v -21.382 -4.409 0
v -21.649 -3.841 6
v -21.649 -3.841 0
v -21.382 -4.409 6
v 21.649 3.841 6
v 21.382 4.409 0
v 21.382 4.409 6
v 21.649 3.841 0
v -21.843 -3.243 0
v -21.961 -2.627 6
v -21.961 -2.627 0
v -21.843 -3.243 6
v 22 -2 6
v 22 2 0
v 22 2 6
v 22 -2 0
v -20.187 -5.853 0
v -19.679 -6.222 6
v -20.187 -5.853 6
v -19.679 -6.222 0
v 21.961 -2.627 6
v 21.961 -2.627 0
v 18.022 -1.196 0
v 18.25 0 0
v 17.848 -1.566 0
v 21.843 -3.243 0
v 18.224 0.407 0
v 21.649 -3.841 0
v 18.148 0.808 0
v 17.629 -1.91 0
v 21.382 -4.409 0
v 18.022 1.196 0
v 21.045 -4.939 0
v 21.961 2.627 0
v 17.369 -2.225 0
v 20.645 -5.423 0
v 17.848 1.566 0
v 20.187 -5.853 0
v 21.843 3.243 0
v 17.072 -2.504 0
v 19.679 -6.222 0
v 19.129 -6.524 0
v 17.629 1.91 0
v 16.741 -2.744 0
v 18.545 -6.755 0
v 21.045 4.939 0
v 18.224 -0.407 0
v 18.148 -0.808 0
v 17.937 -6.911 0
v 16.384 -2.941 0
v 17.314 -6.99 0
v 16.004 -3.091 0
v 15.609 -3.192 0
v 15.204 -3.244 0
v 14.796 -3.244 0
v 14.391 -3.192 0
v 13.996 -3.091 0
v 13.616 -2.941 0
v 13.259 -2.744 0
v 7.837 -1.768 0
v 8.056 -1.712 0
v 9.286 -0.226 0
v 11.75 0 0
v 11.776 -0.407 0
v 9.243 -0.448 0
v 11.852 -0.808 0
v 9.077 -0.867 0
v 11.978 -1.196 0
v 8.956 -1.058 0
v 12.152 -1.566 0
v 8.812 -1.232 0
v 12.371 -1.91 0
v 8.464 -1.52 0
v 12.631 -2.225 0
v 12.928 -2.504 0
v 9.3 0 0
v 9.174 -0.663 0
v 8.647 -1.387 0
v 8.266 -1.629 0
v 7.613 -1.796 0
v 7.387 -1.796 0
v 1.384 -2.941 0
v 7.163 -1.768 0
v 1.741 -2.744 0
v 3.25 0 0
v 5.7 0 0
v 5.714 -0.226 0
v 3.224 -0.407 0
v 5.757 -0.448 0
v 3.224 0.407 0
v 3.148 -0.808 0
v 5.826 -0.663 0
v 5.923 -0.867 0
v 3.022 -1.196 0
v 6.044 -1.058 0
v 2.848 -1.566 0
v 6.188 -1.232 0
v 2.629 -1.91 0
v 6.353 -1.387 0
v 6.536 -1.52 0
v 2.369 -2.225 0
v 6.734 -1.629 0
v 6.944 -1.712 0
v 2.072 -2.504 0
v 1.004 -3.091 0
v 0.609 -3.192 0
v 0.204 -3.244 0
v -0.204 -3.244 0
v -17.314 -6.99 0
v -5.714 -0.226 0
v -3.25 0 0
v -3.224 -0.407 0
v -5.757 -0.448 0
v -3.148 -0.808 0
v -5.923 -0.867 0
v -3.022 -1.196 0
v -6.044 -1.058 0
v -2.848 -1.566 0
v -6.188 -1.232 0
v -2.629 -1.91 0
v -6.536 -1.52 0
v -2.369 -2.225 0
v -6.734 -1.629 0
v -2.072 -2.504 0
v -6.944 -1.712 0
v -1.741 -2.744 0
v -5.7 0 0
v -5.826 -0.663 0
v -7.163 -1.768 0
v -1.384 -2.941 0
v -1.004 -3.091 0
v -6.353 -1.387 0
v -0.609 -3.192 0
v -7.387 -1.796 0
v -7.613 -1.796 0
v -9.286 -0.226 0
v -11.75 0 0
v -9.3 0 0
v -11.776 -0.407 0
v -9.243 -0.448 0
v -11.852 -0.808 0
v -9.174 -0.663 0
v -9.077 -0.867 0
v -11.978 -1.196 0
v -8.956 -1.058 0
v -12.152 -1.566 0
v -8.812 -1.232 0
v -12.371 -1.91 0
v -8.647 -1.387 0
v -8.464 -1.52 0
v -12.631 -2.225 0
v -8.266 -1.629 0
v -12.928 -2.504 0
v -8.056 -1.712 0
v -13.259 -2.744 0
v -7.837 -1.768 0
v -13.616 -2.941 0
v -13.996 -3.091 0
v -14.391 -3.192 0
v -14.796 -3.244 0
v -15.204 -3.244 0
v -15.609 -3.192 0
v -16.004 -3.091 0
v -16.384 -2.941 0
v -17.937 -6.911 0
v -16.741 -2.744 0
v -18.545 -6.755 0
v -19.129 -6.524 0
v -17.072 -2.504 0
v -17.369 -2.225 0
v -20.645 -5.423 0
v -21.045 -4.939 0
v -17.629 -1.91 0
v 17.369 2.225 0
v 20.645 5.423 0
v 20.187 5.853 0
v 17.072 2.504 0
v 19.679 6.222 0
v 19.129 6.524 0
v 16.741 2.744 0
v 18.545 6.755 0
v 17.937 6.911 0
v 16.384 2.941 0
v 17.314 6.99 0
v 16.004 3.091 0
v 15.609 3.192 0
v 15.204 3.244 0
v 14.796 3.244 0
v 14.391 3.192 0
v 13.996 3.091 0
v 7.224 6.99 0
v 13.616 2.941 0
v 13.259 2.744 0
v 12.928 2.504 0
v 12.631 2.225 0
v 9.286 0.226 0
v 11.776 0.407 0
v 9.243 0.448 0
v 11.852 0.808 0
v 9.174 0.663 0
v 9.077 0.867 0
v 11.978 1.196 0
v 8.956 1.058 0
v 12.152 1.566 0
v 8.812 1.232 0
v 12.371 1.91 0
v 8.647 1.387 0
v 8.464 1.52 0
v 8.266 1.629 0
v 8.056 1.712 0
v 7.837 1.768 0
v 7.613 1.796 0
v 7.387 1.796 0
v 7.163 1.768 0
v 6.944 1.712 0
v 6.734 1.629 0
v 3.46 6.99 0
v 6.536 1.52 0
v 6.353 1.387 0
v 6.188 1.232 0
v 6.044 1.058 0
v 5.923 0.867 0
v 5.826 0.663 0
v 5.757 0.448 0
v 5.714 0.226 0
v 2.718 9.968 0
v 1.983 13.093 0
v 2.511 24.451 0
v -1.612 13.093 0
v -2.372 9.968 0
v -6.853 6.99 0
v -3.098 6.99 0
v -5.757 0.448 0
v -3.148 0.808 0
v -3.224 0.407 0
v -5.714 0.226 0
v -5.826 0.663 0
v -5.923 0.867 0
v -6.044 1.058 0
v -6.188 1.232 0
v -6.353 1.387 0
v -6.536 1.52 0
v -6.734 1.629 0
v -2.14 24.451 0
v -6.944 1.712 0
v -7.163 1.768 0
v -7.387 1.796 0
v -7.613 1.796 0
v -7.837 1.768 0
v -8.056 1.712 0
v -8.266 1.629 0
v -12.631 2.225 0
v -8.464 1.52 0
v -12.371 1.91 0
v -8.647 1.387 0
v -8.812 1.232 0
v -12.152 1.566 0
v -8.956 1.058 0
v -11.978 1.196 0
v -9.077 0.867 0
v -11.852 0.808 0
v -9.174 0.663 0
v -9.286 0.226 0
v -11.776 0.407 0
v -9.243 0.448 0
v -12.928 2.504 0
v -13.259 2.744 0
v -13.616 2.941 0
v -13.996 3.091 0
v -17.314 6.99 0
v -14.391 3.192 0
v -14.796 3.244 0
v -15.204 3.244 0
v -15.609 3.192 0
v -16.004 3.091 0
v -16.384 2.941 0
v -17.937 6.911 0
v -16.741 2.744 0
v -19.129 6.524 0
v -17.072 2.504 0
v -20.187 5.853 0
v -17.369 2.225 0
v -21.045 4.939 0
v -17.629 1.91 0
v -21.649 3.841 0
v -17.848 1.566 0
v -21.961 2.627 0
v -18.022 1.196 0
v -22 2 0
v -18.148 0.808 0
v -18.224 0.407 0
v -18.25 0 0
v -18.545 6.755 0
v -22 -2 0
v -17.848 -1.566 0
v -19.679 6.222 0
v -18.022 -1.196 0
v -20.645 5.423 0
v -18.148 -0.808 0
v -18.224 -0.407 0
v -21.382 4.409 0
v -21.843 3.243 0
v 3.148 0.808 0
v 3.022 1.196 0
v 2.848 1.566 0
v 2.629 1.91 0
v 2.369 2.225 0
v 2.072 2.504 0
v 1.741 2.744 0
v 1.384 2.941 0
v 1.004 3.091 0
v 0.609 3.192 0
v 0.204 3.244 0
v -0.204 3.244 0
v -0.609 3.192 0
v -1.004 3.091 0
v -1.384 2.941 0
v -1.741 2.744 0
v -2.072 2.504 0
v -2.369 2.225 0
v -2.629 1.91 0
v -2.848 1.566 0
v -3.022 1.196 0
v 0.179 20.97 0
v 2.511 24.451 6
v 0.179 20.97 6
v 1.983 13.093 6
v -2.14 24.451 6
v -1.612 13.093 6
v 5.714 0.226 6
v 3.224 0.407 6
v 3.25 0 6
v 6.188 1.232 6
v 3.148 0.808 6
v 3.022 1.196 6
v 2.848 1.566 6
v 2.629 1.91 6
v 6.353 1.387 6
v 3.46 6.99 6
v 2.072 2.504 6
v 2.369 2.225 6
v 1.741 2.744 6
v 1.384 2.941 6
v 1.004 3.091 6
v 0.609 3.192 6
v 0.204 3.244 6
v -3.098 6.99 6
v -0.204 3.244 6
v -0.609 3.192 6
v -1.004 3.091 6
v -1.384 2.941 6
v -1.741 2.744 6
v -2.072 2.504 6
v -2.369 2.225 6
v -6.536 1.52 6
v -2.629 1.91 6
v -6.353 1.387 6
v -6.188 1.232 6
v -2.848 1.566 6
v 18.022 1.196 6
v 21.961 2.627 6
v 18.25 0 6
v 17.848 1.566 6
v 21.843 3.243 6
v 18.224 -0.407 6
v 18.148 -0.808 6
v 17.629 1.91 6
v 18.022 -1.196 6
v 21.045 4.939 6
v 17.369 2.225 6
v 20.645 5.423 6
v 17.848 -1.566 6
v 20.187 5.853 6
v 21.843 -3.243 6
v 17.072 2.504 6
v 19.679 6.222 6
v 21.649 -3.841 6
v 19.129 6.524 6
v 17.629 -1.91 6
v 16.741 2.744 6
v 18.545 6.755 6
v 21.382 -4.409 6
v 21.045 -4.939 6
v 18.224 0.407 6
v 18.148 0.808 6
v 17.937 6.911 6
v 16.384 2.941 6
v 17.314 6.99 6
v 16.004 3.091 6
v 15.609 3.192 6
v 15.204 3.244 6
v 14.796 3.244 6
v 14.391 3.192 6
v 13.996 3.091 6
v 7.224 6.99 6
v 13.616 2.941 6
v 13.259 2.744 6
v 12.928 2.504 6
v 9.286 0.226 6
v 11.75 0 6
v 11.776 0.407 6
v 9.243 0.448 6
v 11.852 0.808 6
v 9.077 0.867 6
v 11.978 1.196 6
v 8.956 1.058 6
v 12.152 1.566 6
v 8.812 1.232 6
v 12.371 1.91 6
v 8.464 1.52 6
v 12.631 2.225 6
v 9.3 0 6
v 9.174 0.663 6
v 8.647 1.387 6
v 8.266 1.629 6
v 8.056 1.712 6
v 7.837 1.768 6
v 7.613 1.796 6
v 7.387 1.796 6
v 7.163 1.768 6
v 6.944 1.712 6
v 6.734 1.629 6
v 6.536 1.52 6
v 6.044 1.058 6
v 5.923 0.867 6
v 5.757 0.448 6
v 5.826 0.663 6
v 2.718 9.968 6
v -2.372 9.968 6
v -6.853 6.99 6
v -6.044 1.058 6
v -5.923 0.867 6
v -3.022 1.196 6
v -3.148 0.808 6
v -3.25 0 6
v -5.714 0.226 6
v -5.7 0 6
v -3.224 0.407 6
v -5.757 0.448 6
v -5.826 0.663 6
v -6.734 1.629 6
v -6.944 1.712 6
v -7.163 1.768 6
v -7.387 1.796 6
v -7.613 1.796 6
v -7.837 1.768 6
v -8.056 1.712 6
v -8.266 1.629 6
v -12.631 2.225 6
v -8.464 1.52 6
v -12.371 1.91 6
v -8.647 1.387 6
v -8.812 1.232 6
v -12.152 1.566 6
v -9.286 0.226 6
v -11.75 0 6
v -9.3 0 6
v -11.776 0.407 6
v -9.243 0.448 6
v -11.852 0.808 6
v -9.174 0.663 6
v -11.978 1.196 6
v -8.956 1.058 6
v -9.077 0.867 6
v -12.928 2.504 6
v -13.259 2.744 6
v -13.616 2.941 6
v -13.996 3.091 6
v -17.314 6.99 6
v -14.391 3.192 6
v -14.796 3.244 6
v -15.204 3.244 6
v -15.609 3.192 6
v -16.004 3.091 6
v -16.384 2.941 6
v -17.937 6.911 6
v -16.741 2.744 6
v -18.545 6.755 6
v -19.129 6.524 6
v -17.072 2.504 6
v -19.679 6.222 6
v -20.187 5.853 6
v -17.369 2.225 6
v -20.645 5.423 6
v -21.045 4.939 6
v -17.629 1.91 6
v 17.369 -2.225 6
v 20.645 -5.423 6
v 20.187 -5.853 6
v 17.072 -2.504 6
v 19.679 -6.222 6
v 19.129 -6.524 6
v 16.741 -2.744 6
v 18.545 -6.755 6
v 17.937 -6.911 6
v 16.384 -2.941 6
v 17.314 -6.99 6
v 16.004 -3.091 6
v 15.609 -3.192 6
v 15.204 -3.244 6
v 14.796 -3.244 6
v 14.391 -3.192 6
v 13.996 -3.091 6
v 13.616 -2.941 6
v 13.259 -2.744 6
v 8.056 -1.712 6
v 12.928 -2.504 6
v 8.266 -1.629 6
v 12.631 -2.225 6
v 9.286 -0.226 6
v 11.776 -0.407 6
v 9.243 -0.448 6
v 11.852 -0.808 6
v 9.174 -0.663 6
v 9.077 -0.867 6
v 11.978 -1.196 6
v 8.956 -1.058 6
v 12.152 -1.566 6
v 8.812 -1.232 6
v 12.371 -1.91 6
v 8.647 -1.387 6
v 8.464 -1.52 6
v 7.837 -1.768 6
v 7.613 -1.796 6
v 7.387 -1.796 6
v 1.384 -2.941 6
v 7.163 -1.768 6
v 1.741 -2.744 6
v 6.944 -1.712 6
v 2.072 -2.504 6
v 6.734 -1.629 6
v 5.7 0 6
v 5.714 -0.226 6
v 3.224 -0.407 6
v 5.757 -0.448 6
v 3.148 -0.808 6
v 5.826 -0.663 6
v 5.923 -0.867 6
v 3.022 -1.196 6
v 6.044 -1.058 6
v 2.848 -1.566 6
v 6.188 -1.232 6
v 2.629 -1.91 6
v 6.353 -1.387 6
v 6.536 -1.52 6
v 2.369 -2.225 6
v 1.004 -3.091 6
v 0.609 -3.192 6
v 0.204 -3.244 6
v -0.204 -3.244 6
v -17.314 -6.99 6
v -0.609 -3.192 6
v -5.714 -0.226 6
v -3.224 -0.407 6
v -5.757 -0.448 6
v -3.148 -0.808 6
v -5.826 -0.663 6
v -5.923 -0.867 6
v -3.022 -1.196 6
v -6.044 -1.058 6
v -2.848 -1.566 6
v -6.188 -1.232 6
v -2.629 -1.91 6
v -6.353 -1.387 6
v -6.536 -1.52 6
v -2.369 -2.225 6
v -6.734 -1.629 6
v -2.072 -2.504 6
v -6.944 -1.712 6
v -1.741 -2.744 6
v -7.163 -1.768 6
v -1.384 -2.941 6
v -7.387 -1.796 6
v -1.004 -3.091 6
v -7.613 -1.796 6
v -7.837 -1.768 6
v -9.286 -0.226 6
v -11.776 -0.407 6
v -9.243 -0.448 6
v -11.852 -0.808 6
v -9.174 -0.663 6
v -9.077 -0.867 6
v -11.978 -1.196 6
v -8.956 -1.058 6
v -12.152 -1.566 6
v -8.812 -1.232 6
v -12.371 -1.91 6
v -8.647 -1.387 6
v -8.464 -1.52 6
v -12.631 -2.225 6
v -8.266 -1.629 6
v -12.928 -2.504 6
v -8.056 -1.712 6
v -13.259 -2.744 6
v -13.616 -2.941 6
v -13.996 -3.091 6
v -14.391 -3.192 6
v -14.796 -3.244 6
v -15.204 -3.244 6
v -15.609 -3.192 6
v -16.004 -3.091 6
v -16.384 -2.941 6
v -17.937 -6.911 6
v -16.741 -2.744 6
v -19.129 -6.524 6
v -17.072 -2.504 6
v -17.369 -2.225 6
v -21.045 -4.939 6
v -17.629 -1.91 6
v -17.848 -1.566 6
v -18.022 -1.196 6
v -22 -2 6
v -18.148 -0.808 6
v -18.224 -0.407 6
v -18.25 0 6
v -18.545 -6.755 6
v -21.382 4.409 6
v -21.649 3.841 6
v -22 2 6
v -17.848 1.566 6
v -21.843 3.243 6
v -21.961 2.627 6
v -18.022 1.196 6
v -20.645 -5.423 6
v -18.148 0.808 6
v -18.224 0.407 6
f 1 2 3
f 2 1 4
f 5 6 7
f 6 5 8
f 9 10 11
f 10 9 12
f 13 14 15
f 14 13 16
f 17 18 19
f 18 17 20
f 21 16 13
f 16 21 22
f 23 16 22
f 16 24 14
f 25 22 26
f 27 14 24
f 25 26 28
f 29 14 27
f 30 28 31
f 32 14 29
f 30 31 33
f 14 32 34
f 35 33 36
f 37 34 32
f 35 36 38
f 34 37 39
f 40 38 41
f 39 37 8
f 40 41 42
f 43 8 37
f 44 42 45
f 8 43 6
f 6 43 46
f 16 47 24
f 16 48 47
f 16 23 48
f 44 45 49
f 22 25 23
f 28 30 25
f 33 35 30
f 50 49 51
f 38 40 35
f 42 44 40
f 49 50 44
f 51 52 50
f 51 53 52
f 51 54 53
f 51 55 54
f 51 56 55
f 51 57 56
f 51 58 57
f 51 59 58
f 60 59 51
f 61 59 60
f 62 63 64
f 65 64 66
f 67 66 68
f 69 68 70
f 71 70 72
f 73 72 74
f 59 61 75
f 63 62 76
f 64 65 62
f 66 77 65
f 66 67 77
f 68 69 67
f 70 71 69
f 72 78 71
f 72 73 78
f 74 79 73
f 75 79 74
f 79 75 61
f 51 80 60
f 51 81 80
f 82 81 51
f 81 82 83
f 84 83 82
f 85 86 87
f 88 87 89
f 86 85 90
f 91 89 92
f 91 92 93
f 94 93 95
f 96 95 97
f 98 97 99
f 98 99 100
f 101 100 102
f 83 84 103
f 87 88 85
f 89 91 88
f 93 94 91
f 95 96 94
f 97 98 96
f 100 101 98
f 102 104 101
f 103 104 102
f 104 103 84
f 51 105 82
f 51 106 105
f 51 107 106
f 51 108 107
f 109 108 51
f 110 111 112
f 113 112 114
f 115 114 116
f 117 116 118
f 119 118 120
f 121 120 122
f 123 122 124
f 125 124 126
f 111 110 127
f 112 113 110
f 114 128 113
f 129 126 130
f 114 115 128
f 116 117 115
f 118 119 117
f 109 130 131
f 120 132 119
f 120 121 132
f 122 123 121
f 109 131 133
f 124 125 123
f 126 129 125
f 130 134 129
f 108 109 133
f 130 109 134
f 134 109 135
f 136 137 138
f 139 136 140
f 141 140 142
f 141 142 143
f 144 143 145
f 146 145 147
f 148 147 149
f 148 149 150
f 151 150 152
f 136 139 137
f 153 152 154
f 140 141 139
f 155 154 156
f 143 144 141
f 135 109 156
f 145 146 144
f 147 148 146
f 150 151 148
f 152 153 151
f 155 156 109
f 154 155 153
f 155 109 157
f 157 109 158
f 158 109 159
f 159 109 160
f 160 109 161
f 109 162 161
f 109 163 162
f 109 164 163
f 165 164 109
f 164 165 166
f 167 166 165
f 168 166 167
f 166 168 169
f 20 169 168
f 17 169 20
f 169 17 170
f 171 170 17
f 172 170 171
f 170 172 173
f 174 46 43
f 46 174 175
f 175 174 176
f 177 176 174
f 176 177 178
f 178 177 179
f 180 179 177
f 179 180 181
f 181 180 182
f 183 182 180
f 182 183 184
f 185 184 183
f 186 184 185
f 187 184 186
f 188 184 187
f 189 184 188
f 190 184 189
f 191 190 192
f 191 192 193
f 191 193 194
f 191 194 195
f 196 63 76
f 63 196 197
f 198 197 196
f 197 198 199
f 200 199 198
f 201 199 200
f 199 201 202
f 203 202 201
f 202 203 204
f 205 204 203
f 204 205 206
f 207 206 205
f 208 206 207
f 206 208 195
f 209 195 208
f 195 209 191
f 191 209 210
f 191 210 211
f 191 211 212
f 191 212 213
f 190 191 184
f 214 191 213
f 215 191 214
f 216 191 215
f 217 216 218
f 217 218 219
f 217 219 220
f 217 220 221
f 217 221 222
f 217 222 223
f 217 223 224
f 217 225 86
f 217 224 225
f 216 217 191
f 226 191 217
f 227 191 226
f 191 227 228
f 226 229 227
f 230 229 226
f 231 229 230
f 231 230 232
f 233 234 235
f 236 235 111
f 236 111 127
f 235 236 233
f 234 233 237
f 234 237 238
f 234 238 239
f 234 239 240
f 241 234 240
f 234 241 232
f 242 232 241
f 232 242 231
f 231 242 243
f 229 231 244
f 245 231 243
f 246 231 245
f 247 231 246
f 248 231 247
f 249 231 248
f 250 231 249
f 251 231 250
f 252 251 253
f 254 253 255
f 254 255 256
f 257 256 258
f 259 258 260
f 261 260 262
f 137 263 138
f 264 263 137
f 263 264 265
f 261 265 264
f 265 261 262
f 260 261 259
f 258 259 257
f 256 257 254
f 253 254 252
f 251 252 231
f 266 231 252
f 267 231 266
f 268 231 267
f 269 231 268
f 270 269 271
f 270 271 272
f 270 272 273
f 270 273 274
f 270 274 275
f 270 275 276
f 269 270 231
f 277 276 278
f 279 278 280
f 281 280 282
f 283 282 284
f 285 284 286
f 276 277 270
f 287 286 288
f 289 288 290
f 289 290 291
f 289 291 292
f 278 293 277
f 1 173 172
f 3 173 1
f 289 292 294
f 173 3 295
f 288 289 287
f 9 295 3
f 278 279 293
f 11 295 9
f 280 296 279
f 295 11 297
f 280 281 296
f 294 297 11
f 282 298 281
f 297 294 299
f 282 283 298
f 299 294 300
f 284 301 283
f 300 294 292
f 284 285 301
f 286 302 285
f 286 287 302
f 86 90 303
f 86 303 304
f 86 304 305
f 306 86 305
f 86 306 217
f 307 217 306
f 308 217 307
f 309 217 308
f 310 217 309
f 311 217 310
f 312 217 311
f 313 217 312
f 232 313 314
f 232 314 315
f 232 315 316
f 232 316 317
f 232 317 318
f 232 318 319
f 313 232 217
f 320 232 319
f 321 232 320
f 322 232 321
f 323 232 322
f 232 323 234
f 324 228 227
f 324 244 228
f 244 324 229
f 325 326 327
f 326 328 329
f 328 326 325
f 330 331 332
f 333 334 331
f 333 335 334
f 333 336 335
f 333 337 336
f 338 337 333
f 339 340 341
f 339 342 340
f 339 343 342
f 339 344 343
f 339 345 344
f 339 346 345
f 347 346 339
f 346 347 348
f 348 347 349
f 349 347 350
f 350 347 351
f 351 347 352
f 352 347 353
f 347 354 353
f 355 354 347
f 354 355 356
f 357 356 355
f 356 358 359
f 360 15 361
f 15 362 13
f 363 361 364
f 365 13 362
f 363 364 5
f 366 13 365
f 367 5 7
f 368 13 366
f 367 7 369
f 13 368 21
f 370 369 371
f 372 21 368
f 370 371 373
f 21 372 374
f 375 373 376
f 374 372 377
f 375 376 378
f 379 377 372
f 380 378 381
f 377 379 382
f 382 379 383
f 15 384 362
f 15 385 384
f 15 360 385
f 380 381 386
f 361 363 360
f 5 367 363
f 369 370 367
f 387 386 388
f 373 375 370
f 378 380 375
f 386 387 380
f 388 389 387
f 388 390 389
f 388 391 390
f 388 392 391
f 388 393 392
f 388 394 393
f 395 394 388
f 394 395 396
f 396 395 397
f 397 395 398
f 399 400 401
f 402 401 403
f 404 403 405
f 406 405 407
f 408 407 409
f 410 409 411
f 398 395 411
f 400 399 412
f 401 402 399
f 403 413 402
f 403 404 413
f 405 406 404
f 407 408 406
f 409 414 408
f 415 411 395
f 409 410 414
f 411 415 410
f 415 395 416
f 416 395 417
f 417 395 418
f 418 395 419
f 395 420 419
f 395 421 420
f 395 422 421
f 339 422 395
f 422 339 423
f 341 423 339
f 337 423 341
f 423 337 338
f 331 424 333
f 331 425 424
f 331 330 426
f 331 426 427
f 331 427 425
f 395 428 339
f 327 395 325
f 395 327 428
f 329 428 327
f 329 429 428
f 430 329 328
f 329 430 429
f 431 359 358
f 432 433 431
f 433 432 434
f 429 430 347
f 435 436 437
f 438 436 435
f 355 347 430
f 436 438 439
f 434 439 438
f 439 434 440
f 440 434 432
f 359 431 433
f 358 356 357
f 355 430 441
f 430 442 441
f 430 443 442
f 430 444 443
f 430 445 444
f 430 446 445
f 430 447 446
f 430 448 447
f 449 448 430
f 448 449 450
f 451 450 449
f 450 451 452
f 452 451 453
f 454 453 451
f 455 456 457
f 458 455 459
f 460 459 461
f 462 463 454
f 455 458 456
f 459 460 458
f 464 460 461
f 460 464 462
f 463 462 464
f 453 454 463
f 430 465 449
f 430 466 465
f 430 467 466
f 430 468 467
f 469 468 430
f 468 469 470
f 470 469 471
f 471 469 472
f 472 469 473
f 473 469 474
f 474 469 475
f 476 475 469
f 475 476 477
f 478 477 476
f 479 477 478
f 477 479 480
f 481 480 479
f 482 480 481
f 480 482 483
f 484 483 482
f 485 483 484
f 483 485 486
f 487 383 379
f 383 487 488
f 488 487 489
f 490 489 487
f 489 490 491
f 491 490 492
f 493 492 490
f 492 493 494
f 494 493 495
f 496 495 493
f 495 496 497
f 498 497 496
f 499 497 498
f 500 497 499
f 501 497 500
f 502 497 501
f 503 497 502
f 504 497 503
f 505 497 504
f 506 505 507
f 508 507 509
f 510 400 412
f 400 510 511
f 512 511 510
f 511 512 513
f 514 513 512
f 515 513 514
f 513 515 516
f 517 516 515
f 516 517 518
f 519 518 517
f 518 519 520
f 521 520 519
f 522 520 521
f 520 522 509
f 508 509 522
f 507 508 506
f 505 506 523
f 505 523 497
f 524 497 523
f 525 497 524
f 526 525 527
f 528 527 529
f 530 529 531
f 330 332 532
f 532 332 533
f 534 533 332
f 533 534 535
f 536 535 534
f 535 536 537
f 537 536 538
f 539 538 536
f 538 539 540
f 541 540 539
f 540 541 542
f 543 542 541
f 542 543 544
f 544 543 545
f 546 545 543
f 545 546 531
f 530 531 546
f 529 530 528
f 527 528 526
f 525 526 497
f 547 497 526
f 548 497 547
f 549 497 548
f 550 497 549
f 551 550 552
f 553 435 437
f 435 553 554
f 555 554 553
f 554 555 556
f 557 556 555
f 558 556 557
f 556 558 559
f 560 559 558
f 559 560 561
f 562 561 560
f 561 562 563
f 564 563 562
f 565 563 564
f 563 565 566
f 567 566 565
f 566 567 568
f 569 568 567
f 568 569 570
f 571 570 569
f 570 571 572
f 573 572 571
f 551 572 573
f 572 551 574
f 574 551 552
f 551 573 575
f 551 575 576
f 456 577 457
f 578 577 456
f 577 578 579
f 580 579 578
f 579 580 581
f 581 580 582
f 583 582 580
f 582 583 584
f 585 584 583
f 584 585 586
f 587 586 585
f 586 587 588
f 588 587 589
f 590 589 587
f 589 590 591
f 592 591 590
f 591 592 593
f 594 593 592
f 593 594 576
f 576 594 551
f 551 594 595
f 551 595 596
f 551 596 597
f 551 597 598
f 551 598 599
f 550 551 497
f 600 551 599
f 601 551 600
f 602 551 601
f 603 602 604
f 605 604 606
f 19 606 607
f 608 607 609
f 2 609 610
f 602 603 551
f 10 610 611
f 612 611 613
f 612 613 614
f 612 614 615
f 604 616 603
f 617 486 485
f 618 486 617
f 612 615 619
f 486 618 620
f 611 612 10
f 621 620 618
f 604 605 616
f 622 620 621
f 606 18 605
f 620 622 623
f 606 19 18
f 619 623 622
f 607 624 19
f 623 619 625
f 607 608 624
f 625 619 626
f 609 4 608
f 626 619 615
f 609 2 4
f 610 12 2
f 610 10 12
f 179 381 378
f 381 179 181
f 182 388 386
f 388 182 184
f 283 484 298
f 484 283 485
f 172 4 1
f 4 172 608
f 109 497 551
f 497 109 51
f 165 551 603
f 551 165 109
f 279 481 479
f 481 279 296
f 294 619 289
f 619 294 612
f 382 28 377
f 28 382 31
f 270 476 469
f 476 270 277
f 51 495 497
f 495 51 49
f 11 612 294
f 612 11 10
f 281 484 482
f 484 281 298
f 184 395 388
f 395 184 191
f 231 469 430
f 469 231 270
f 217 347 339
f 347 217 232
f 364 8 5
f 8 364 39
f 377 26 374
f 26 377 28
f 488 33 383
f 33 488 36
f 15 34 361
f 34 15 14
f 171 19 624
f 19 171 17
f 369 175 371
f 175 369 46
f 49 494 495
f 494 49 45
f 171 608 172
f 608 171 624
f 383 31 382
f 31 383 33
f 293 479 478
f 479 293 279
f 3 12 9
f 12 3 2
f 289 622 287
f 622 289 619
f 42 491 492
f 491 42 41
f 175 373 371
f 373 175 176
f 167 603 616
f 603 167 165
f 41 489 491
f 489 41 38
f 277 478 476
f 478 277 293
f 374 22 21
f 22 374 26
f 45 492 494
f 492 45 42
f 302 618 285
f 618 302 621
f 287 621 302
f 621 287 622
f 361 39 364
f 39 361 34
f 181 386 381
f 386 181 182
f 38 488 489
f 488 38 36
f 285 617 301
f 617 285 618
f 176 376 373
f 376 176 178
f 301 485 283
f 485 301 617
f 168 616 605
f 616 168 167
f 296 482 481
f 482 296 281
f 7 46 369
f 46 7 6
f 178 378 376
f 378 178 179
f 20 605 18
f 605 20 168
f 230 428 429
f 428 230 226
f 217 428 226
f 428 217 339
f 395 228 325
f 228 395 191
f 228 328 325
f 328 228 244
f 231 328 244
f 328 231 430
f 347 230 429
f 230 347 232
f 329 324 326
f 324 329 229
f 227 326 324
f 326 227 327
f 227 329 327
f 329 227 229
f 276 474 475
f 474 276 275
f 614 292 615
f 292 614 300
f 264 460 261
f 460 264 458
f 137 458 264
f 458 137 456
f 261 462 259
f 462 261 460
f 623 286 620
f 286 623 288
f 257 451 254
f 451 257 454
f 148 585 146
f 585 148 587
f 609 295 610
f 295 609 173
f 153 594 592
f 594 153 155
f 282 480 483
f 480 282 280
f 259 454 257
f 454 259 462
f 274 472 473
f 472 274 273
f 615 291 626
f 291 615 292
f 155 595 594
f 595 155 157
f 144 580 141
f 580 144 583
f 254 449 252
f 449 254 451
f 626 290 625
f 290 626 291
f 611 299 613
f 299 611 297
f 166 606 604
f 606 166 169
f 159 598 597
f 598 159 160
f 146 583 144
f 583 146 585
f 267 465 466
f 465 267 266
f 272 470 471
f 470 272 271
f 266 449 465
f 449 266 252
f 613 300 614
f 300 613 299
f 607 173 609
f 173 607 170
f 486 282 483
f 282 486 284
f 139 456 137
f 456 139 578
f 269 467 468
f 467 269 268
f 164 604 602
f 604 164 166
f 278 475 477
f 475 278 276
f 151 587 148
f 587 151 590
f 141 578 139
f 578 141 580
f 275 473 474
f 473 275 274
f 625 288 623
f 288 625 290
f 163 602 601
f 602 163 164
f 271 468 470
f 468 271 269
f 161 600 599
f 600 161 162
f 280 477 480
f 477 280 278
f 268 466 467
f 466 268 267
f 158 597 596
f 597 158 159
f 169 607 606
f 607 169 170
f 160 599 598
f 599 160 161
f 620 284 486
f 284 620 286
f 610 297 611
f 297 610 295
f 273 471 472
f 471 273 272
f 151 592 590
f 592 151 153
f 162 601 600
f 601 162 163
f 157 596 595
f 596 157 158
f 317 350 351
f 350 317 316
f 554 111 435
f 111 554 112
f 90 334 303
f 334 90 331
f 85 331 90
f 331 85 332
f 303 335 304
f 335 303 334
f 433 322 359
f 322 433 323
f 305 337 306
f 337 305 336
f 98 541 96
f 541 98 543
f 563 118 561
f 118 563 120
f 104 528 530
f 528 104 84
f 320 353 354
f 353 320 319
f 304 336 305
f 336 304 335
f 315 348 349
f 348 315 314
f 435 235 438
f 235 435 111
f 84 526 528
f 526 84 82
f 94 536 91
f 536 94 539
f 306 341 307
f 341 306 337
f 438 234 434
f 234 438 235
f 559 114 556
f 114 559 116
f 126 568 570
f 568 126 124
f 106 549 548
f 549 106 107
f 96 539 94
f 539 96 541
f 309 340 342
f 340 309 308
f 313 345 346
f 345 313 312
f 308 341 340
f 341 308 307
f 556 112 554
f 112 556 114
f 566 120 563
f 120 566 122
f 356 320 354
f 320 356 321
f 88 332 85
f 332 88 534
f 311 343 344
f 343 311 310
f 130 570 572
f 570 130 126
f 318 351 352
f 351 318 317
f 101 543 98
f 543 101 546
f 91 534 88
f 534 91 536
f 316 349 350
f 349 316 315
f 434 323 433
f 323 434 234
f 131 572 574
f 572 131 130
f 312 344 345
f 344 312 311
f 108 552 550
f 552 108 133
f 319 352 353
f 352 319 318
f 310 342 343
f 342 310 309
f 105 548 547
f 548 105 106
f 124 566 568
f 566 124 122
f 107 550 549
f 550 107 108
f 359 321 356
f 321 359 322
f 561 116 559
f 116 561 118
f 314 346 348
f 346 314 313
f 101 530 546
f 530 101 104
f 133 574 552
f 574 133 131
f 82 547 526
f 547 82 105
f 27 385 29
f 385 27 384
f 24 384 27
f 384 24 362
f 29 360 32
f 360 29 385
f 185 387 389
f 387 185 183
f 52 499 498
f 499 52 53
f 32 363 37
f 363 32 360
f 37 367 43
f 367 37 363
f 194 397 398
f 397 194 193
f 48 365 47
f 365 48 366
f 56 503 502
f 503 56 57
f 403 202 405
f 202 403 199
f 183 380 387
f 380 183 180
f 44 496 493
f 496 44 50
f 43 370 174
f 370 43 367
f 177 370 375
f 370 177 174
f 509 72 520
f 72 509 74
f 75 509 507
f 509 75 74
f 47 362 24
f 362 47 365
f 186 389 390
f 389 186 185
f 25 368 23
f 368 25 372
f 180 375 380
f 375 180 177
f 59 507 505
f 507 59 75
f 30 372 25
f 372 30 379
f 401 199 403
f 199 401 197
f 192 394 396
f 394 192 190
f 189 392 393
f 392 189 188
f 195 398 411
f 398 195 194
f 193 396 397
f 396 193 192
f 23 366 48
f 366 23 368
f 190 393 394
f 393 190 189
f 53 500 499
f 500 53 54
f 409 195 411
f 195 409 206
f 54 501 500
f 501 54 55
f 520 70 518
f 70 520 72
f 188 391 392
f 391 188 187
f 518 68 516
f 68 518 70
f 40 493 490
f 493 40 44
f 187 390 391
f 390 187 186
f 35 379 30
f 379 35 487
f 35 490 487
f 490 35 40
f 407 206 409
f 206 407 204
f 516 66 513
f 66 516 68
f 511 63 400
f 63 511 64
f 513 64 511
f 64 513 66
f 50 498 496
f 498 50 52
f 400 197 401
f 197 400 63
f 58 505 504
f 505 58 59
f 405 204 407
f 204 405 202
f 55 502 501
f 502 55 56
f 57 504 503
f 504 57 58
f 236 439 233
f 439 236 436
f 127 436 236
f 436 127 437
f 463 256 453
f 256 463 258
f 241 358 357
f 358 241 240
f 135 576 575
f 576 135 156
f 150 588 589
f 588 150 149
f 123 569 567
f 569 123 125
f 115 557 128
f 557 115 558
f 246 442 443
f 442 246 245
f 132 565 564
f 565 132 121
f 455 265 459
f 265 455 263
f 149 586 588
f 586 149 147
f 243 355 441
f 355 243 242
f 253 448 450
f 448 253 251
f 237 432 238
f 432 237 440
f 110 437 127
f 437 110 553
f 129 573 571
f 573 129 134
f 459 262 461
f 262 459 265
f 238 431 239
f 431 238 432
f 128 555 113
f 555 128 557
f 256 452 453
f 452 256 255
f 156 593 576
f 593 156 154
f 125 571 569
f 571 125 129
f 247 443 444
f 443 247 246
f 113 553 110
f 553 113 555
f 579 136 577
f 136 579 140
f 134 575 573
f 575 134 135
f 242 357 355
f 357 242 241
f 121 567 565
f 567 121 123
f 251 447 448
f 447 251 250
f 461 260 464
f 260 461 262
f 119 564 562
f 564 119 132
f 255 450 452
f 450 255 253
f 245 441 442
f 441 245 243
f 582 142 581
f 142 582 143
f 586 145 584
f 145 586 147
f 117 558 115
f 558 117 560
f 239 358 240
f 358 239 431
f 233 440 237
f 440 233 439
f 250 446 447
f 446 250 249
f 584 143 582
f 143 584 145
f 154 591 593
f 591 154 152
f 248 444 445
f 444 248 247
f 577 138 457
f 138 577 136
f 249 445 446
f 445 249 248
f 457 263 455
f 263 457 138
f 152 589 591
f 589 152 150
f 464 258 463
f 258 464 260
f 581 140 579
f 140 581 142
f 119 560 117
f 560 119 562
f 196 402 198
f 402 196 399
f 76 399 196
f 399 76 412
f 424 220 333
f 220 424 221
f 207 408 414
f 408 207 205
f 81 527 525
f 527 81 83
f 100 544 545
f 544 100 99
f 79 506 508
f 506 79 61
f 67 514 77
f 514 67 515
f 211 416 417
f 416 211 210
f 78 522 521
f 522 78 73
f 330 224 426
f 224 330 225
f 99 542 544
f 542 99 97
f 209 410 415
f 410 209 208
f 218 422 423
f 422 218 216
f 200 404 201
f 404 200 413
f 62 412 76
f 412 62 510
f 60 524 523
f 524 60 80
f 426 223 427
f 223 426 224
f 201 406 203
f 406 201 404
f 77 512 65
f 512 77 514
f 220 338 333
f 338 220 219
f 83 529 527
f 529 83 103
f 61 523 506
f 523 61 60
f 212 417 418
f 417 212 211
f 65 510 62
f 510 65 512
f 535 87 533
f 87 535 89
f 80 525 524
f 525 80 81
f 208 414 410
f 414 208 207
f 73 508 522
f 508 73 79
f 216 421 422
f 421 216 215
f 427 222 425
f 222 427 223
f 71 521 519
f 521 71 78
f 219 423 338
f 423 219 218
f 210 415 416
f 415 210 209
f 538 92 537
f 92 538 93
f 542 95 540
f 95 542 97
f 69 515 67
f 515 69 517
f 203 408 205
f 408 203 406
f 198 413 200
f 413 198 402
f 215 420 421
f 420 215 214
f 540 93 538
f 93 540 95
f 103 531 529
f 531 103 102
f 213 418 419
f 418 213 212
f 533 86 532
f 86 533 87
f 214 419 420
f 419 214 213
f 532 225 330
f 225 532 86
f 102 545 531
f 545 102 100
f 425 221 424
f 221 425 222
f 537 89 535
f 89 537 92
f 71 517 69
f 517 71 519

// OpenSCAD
$fn = 50;


difference() {
	union() {
		hull() {
			translate(v = [-17.0000000000, 2.0000000000, 0]) {
				cylinder(h = 6, r = 5);
			}
			translate(v = [17.0000000000, 2.0000000000, 0]) {
				cylinder(h = 6, r = 5);
			}
			translate(v = [-17.0000000000, -2.0000000000, 0]) {
				cylinder(h = 6, r = 5);
			}
			translate(v = [17.0000000000, -2.0000000000, 0]) {
				cylinder(h = 6, r = 5);
			}
		}
		translate(v = [0, 24, 0]) {
			linear_extrude(height = 6) {
				text(font = "DejaVu Sans Mono:style=Bold", halign = "center", size = 19.0000000000, text = "A", valign = "top");
			}
		}
	}
	union() {
		translate(v = [-15.0000000000, 0.0000000000, 0]) {
			translate(v = [0, 0, -100]) {
				cylinder(h = 200, r = 3.2500000000);
			}
		}
		translate(v = [0, 0, -100]) {
			cylinder(h = 200, r = 3.2500000000);
		}
		translate(v = [15.0000000000, 0.0000000000, 0]) {
			translate(v = [0, 0, -100]) {
				cylinder(h = 200, r = 3.2500000000);
			}
		}
		translate(v = [-15.0000000000, 0.0000000000, 0]) {
			translate(v = [0, 0, -100]) {
				cylinder(h = 200, r = 1.8000000000);
			}
		}
		translate(v = [-7.5000000000, 0.0000000000, 0]) {
			translate(v = [0, 0, -100]) {
				cylinder(h = 200, r = 1.8000000000);
			}
		}
		translate(v = [0, 0, -100]) {
			cylinder(h = 200, r = 1.8000000000);
		}
		translate(v = [7.5000000000, 0.0000000000, 0]) {
			translate(v = [0, 0, -100]) {
				cylinder(h = 200, r = 1.8000000000);
			}
		}
		translate(v = [15.0000000000, 0.0000000000, 0]) {
			translate(v = [0, 0, -100]) {
				cylinder(h = 200, r = 1.8000000000);
			}
		}
	}
}
